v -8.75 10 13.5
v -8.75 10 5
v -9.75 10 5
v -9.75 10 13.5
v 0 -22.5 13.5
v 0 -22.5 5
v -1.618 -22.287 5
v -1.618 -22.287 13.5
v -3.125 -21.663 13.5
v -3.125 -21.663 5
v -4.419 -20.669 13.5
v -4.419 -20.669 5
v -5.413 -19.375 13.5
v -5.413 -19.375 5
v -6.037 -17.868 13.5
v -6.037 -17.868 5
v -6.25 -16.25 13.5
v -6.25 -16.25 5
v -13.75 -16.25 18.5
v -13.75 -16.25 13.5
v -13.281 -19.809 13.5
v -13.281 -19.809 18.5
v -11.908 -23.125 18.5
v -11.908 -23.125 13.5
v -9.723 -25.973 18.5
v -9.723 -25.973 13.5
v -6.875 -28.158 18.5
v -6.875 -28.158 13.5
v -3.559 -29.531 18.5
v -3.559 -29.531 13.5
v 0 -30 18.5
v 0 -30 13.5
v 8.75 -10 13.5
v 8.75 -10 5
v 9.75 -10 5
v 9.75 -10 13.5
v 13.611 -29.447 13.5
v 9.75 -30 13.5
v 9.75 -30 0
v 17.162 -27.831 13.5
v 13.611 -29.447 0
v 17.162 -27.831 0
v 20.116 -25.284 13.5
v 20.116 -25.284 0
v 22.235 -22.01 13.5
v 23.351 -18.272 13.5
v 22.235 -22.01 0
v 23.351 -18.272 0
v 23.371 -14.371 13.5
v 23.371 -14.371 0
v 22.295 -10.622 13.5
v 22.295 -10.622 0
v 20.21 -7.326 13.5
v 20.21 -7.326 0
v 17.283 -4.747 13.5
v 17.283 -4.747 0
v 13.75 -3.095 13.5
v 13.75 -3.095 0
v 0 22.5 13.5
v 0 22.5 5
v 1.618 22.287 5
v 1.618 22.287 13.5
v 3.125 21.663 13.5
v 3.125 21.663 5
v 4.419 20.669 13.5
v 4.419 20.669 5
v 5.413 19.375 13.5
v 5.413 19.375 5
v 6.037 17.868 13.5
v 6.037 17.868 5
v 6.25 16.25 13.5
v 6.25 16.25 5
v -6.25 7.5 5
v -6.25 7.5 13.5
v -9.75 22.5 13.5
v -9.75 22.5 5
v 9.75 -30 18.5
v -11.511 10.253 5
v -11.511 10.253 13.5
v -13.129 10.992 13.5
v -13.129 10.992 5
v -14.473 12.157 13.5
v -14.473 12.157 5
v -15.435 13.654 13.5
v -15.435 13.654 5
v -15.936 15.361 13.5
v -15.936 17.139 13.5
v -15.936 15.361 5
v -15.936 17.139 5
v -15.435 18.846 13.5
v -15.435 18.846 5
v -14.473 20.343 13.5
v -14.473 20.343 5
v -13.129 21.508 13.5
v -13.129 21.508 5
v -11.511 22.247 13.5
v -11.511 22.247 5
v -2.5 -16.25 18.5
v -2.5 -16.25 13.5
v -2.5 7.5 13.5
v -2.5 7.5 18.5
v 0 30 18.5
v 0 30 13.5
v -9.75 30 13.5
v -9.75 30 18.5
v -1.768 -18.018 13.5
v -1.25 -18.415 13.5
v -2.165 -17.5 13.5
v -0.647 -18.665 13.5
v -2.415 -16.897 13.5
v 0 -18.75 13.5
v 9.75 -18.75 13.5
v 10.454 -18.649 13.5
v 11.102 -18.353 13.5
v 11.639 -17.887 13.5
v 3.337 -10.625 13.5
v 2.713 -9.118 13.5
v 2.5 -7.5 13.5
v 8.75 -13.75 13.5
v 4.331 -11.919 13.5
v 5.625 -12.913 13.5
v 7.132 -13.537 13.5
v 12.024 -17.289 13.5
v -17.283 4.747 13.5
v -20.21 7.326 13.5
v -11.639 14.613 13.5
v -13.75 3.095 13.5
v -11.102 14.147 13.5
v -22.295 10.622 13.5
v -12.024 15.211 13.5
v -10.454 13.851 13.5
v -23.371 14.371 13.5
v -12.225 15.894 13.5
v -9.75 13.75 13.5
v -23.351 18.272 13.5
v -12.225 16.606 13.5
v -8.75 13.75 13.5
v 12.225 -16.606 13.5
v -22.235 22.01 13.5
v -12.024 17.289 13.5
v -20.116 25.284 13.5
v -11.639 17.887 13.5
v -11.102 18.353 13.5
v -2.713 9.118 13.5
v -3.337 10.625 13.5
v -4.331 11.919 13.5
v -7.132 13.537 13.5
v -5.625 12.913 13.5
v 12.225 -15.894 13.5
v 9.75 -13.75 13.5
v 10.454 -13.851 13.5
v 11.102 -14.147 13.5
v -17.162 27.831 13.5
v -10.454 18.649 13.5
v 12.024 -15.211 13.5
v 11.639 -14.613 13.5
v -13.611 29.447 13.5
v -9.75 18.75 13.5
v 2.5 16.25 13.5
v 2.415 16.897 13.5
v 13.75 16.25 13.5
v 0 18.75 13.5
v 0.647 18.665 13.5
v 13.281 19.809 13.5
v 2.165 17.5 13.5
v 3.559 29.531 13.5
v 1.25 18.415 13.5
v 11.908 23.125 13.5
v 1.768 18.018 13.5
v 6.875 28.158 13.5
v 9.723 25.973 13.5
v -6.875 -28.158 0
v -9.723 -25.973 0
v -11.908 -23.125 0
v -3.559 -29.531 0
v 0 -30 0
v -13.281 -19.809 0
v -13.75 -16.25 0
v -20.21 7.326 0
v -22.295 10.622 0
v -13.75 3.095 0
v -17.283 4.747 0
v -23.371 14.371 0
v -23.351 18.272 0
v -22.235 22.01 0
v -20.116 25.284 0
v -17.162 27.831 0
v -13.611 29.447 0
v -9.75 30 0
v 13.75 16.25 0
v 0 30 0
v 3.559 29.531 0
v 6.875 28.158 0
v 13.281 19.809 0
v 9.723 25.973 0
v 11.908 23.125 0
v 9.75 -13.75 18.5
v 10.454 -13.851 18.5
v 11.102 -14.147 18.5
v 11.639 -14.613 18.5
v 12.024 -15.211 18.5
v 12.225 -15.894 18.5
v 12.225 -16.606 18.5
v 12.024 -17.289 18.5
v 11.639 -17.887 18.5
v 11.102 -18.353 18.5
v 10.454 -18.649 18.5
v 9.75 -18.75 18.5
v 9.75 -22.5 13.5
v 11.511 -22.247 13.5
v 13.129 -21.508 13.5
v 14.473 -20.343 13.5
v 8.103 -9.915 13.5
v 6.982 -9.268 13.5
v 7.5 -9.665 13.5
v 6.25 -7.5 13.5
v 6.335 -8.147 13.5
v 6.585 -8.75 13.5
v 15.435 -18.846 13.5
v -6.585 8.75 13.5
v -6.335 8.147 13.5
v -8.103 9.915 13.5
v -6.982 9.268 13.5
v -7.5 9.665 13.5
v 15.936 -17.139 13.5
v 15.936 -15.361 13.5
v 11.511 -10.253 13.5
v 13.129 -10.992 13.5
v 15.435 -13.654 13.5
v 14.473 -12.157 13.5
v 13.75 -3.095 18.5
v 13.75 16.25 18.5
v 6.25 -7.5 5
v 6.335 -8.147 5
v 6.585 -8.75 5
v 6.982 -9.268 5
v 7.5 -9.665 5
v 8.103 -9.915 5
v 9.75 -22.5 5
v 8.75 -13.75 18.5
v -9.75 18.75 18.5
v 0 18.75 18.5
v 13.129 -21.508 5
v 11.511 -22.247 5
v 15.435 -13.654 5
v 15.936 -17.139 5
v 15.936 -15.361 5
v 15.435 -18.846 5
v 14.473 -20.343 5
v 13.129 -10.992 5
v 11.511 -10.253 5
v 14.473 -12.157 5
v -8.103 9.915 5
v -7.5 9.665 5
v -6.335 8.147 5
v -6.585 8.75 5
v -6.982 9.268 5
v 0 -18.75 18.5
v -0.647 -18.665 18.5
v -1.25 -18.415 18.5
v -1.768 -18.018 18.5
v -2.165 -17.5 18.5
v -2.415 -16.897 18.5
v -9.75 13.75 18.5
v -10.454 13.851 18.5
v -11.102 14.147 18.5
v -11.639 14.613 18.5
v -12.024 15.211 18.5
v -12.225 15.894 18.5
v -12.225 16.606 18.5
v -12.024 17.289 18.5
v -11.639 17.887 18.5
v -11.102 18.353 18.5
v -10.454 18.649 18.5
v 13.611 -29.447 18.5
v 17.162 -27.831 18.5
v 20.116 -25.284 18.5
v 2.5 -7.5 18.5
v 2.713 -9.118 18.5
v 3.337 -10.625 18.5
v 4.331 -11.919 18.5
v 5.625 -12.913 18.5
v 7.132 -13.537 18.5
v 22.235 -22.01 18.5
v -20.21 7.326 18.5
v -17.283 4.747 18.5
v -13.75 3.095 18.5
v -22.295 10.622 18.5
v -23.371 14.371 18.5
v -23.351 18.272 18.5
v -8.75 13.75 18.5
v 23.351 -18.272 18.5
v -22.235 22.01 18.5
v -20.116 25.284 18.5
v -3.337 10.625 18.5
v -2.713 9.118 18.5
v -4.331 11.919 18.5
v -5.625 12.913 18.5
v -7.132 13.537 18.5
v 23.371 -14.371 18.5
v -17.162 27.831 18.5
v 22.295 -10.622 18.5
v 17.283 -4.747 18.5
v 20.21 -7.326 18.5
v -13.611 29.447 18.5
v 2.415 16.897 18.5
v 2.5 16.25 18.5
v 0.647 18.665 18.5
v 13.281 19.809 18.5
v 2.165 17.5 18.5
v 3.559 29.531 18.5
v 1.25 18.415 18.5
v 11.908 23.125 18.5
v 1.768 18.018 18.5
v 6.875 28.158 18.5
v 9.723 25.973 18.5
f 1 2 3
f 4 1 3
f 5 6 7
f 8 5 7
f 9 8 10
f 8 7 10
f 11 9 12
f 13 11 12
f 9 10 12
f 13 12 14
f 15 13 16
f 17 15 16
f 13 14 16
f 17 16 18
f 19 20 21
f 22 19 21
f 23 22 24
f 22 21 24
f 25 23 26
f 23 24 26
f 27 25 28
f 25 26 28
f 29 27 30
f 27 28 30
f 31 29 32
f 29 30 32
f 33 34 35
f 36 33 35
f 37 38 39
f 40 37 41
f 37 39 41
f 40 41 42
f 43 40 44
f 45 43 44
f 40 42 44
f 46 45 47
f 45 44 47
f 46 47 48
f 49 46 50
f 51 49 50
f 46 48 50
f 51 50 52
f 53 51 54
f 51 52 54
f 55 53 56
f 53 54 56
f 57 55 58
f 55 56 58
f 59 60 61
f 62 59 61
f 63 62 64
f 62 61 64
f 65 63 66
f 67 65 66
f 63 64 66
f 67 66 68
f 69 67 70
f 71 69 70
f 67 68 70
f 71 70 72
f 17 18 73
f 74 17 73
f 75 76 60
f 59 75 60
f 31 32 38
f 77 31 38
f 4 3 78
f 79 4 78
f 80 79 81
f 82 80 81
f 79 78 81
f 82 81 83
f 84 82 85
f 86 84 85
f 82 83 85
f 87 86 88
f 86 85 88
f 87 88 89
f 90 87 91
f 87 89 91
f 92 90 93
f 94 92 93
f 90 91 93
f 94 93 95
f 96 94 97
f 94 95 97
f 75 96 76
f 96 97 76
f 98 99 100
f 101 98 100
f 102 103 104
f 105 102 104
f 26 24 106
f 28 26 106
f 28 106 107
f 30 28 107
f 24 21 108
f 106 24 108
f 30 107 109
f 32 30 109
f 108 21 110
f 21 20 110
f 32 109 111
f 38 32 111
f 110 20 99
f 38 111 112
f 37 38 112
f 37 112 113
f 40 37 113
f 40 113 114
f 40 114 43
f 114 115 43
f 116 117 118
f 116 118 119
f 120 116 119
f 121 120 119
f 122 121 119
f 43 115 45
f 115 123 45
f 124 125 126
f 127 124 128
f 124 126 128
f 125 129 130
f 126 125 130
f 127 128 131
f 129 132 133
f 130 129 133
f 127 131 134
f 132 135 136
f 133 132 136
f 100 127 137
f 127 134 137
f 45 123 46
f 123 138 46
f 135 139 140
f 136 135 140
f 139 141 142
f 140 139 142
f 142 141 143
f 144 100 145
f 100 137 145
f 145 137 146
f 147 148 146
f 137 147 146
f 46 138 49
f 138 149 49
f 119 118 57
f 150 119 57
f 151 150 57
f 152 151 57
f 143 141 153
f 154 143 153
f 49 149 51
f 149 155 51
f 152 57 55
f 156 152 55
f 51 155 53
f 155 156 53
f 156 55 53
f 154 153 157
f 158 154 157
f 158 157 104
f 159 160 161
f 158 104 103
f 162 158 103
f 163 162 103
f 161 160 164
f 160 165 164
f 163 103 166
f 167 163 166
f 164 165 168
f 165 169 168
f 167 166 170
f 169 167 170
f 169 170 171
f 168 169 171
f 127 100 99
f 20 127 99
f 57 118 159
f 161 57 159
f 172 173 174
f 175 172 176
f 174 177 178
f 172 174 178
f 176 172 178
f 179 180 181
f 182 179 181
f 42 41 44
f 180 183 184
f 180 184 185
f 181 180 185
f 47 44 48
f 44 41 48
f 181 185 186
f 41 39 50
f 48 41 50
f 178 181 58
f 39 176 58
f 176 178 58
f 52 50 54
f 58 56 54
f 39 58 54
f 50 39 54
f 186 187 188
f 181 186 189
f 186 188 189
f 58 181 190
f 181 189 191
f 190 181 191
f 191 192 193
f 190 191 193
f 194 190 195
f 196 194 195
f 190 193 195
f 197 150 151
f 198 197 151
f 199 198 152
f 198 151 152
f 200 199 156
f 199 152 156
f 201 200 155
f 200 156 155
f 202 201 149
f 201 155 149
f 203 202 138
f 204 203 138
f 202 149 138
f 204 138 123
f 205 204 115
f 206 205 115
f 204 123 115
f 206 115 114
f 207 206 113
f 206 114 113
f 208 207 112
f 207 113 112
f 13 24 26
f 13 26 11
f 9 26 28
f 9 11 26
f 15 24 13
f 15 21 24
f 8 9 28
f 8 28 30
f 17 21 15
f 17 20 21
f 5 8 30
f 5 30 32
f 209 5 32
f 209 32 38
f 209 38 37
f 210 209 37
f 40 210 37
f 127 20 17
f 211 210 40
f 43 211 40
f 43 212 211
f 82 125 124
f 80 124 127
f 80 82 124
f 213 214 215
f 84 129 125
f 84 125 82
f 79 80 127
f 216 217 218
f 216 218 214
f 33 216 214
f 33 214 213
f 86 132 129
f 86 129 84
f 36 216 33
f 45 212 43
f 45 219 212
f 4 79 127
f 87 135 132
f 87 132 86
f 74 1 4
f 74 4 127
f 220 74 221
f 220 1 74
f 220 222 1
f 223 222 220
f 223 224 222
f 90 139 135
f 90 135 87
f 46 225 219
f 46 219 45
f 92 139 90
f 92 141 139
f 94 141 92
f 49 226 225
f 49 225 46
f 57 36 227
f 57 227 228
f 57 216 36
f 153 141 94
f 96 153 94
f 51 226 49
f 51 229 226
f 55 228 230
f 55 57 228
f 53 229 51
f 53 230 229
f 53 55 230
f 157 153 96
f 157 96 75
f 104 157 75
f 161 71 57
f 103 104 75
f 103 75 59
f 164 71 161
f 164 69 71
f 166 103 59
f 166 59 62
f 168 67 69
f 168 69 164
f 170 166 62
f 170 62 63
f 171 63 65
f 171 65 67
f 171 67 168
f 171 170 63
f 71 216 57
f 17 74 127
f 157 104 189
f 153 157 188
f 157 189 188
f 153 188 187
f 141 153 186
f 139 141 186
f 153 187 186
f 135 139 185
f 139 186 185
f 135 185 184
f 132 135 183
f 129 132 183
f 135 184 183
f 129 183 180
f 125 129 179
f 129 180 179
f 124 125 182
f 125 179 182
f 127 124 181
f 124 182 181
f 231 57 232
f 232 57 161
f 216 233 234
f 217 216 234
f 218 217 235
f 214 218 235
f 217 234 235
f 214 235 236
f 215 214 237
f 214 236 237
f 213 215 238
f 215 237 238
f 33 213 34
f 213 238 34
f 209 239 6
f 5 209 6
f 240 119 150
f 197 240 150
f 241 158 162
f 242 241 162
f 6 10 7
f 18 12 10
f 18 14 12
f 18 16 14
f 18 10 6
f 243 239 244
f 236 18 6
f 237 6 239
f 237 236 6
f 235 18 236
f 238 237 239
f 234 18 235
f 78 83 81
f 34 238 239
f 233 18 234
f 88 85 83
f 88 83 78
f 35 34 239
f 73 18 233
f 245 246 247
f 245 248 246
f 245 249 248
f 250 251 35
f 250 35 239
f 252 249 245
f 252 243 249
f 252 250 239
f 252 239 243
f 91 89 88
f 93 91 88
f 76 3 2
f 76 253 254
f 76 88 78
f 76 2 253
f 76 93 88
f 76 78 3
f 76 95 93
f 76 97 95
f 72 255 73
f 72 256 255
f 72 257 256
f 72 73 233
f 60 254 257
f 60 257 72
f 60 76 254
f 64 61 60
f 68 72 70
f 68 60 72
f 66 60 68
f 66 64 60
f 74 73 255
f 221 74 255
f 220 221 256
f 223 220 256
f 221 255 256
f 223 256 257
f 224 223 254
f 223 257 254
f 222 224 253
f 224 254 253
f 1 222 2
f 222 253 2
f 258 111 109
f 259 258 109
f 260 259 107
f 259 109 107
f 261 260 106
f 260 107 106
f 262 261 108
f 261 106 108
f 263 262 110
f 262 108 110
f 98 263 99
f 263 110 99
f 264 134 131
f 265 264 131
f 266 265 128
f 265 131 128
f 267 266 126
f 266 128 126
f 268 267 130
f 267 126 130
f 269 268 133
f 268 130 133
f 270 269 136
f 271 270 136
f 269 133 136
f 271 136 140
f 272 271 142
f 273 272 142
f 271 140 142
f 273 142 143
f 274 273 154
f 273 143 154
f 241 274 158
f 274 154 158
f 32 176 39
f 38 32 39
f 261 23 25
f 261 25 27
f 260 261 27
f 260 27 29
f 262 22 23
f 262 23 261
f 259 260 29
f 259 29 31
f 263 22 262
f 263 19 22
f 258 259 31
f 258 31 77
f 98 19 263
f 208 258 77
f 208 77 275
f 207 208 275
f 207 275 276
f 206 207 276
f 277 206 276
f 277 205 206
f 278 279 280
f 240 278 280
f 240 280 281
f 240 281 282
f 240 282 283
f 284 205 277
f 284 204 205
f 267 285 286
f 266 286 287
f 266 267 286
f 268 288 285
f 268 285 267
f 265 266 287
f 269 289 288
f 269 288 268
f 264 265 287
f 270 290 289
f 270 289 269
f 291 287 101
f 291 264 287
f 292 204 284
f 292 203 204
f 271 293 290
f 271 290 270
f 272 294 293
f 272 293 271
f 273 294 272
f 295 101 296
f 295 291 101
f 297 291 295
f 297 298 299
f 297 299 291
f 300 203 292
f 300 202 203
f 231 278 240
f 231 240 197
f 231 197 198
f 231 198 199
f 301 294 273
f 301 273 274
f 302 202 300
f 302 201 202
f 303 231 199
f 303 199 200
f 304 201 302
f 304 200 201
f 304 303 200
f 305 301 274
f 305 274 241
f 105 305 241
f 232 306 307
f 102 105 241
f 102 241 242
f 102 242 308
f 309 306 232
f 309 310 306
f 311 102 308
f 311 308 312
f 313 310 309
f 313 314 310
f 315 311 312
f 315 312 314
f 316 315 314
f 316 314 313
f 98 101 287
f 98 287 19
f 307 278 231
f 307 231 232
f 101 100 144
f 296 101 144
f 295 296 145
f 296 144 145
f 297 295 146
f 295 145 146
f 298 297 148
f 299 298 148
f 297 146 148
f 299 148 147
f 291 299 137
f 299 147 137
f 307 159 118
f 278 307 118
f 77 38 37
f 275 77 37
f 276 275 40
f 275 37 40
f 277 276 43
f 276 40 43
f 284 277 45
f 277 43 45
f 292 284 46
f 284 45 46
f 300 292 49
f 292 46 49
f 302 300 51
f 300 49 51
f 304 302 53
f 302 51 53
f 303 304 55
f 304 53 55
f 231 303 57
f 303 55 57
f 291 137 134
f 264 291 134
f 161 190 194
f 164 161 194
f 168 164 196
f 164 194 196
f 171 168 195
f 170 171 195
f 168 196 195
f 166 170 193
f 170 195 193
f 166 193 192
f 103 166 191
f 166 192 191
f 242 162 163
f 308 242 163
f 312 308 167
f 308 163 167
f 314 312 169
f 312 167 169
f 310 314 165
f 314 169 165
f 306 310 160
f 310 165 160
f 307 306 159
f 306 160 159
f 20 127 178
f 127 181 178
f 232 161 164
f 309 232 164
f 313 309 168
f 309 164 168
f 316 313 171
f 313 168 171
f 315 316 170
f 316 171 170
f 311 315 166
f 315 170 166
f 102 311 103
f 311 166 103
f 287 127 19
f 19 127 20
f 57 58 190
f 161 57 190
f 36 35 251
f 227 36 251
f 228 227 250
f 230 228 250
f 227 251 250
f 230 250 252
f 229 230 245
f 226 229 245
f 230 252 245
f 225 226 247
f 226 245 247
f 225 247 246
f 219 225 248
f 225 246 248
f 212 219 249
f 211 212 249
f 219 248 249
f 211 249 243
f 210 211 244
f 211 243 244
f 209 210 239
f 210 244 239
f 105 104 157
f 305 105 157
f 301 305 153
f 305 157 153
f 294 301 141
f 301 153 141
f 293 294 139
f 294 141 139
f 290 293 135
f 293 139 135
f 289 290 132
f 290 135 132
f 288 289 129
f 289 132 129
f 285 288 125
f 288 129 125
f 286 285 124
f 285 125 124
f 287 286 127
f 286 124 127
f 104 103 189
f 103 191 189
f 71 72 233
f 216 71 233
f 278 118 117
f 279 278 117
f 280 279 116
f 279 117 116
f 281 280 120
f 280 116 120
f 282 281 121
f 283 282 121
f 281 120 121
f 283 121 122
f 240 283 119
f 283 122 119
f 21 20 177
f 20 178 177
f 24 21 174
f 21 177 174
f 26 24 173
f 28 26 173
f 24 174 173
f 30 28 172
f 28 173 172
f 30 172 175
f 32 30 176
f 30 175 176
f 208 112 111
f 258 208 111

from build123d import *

# Parameters (mm, degrees)
F1_DEPTH = 5
F2_START = 5
F2_DEPTH = 8.5
F3_START = 13.5
F3_DEPTH = 5


with BuildPart() as f1:
    # F0 (on Top) → F1 (new body)
    with BuildSketch(Plane.XY):
        with BuildLine():
            ThreePointArc((13.7499991953, 16.25), (9.7227176723, 25.9727176723), (0, 29.9999991953))
            Line((0, 29.9999991953), (-9.75, 29.9999991953))
            ThreePointArc((-9.75, 29.9999991953), (-23.3505172364, 18.2719813983), (-13.7499991953, 3.0946784794))
            Line((-13.7499991953, 3.0946784794), (-13.7499991953, -16.25))
            ThreePointArc((-13.7499991953, -16.25), (-9.7227176723, -25.9727176723), (0, -29.9999991953))
            Line((0, -29.9999991953), (9.75, -29.9999991953))
            ThreePointArc((9.75, -29.9999991953), (23.3505172364, -18.2719813983), (13.7499991953, -3.0946784794))
            Line((13.7499991953, -3.0946784794), (13.7499991953, 16.25))
        make_face()
        with BuildLine():
            ThreePointArc((-9.75, 10), (-16, 16.25), (-9.75, 22.5))
            Line((-9.75, 22.5), (0, 22.5))
            ThreePointArc((0, 22.5), (4.4194173824, 20.6694173824), (6.25, 16.25))
            Line((6.25, 16.25), (6.25, -7.5))
            ThreePointArc((6.25, -7.5), (6.982233047, -9.267766953), (8.75, -10))
            Line((8.75, -10), (9.75, -10))
            ThreePointArc((9.75, -10), (16, -16.25), (9.75, -22.5))
            Line((9.75, -22.5), (0, -22.5))
            ThreePointArc((0, -22.5), (-4.4194173824, -20.6694173824), (-6.25, -16.25))
            Line((-6.25, -16.25), (-6.25, 7.5))
            ThreePointArc((-6.25, 7.5), (-6.982233047, 9.267766953), (-8.75, 10))
            Line((-8.75, 10), (-9.75, 10))
        make_face(mode=Mode.SUBTRACT)
        with BuildLine():
            Line((0, 22.5), (-9.75, 22.5))
            ThreePointArc((-9.75, 22.5), (-16, 16.25), (-9.75, 10))
            Line((-9.75, 10), (-8.75, 10))
            ThreePointArc((-8.75, 10), (-6.982233047, 9.267766953), (-6.25, 7.5))
            Line((-6.25, 7.5), (-6.25, -16.25))
            ThreePointArc((-6.25, -16.25), (-4.4194173824, -20.6694173824), (0, -22.5))
            Line((0, -22.5), (9.75, -22.5))
            ThreePointArc((9.75, -22.5), (16, -16.25), (9.75, -10))
            Line((9.75, -10), (8.75, -10))
            ThreePointArc((8.75, -10), (6.982233047, -9.267766953), (6.25, -7.5))
            Line((6.25, -7.5), (6.25, 16.25))
            ThreePointArc((6.25, 16.25), (4.4194173824, 20.6694173824), (0, 22.5))
        make_face()
        with BuildLine():
            Line((-2.5, -16.25), (-2.5, 7.5))
            ThreePointArc((-2.5, 7.5), (-4.3305826176, 11.9194173824), (-8.75, 13.75))
            Line((-8.75, 13.75), (-9.75, 13.75))
            ThreePointArc((-9.75, 13.75), (-12.25, 16.25), (-9.75, 18.75))
            Line((-9.75, 18.75), (0, 18.75))
            ThreePointArc((0, 18.75), (1.767766953, 18.017766953), (2.5, 16.25))
            Line((2.5, 16.25), (2.5, -7.5))
            ThreePointArc((2.5, -7.5), (4.3305826176, -11.9194173824), (8.75, -13.75))
            Line((8.75, -13.75), (9.75, -13.75))
            ThreePointArc((9.75, -13.75), (12.25, -16.25), (9.75, -18.75))
            Line((9.75, -18.75), (0, -18.75))
            ThreePointArc((0, -18.75), (-1.767766953, -18.017766953), (-2.5, -16.25))
        make_face(mode=Mode.SUBTRACT)
        with BuildLine():
            ThreePointArc((-8.75, 13.75), (-4.3305826176, 11.9194173824), (-2.5, 7.5))
            Line((-2.5, 7.5), (-2.5, -16.25))
            ThreePointArc((-2.5, -16.25), (-1.767766953, -18.017766953), (0, -18.75))
            Line((0, -18.75), (9.75, -18.75))
            ThreePointArc((9.75, -18.75), (12.25, -16.25), (9.75, -13.75))
            Line((9.75, -13.75), (8.75, -13.75))
            ThreePointArc((8.75, -13.75), (4.3305826176, -11.9194173824), (2.5, -7.5))
            Line((2.5, -7.5), (2.5, 16.25))
            ThreePointArc((2.5, 16.25), (1.767766953, 18.017766953), (0, 18.75))
            Line((0, 18.75), (-9.75, 18.75))
            ThreePointArc((-9.75, 18.75), (-12.25, 16.25), (-9.75, 13.75))
            Line((-9.75, 13.75), (-8.75, 13.75))
        make_face()
    extrude(amount=F1_DEPTH)

    # F0 (on Top) → F2 (join)
    with BuildSketch(Plane.XY.offset(F2_START)):
        with BuildLine():
            ThreePointArc((13.7499991953, 16.25), (9.7227176723, 25.9727176723), (0, 29.9999991953))
            Line((0, 29.9999991953), (-9.75, 29.9999991953))
            ThreePointArc((-9.75, 29.9999991953), (-23.3505172364, 18.2719813983), (-13.7499991953, 3.0946784794))
            Line((-13.7499991953, 3.0946784794), (-13.7499991953, -16.25))
            ThreePointArc((-13.7499991953, -16.25), (-9.7227176723, -25.9727176723), (0, -29.9999991953))
            Line((0, -29.9999991953), (9.75, -29.9999991953))
            ThreePointArc((9.75, -29.9999991953), (23.3505172364, -18.2719813983), (13.7499991953, -3.0946784794))
            Line((13.7499991953, -3.0946784794), (13.7499991953, 16.25))
        make_face()
        with BuildLine():
            ThreePointArc((-9.75, 10), (-16, 16.25), (-9.75, 22.5))
            Line((-9.75, 22.5), (0, 22.5))
            ThreePointArc((0, 22.5), (4.4194173824, 20.6694173824), (6.25, 16.25))
            Line((6.25, 16.25), (6.25, -7.5))
            ThreePointArc((6.25, -7.5), (6.982233047, -9.267766953), (8.75, -10))
            Line((8.75, -10), (9.75, -10))
            ThreePointArc((9.75, -10), (16, -16.25), (9.75, -22.5))
            Line((9.75, -22.5), (0, -22.5))
            ThreePointArc((0, -22.5), (-4.4194173824, -20.6694173824), (-6.25, -16.25))
            Line((-6.25, -16.25), (-6.25, 7.5))
            ThreePointArc((-6.25, 7.5), (-6.982233047, 9.267766953), (-8.75, 10))
            Line((-8.75, 10), (-9.75, 10))
        make_face(mode=Mode.SUBTRACT)
    extrude(amount=F2_DEPTH)


with BuildPart() as f3:
    # F0 (on Top) → F3 (new body)
    with BuildSketch(Plane.XY.offset(F3_START)):
        with BuildLine():
            ThreePointArc((13.7499991953, 16.25), (9.7227176723, 25.9727176723), (0, 29.9999991953))
            Line((0, 29.9999991953), (-9.75, 29.9999991953))
            ThreePointArc((-9.75, 29.9999991953), (-23.3505172364, 18.2719813983), (-13.7499991953, 3.0946784794))
            Line((-13.7499991953, 3.0946784794), (-13.7499991953, -16.25))
            ThreePointArc((-13.7499991953, -16.25), (-9.7227176723, -25.9727176723), (0, -29.9999991953))
            Line((0, -29.9999991953), (9.75, -29.9999991953))
            ThreePointArc((9.75, -29.9999991953), (23.3505172364, -18.2719813983), (13.7499991953, -3.0946784794))
            Line((13.7499991953, -3.0946784794), (13.7499991953, 16.25))
        make_face()
        with BuildLine():
            ThreePointArc((-9.75, 10), (-16, 16.25), (-9.75, 22.5))
            Line((-9.75, 22.5), (0, 22.5))
            ThreePointArc((0, 22.5), (4.4194173824, 20.6694173824), (6.25, 16.25))
            Line((6.25, 16.25), (6.25, -7.5))
            ThreePointArc((6.25, -7.5), (6.982233047, -9.267766953), (8.75, -10))
            Line((8.75, -10), (9.75, -10))
            ThreePointArc((9.75, -10), (16, -16.25), (9.75, -22.5))
            Line((9.75, -22.5), (0, -22.5))
            ThreePointArc((0, -22.5), (-4.4194173824, -20.6694173824), (-6.25, -16.25))
            Line((-6.25, -16.25), (-6.25, 7.5))
            ThreePointArc((-6.25, 7.5), (-6.982233047, 9.267766953), (-8.75, 10))
            Line((-8.75, 10), (-9.75, 10))
        make_face(mode=Mode.SUBTRACT)
        with BuildLine():
            Line((0, 22.5), (-9.75, 22.5))
            ThreePointArc((-9.75, 22.5), (-16, 16.25), (-9.75, 10))
            Line((-9.75, 10), (-8.75, 10))
            ThreePointArc((-8.75, 10), (-6.982233047, 9.267766953), (-6.25, 7.5))
            Line((-6.25, 7.5), (-6.25, -16.25))
            ThreePointArc((-6.25, -16.25), (-4.4194173824, -20.6694173824), (0, -22.5))
            Line((0, -22.5), (9.75, -22.5))
            ThreePointArc((9.75, -22.5), (16, -16.25), (9.75, -10))
            Line((9.75, -10), (8.75, -10))
            ThreePointArc((8.75, -10), (6.982233047, -9.267766953), (6.25, -7.5))
            Line((6.25, -7.5), (6.25, 16.25))
            ThreePointArc((6.25, 16.25), (4.4194173824, 20.6694173824), (0, 22.5))
        make_face()
        with BuildLine():
            Line((-2.5, -16.25), (-2.5, 7.5))
            ThreePointArc((-2.5, 7.5), (-4.3305826176, 11.9194173824), (-8.75, 13.75))
            Line((-8.75, 13.75), (-9.75, 13.75))
            ThreePointArc((-9.75, 13.75), (-12.25, 16.25), (-9.75, 18.75))
            Line((-9.75, 18.75), (0, 18.75))
            ThreePointArc((0, 18.75), (1.767766953, 18.017766953), (2.5, 16.25))
            Line((2.5, 16.25), (2.5, -7.5))
            ThreePointArc((2.5, -7.5), (4.3305826176, -11.9194173824), (8.75, -13.75))
            Line((8.75, -13.75), (9.75, -13.75))
            ThreePointArc((9.75, -13.75), (12.25, -16.25), (9.75, -18.75))
            Line((9.75, -18.75), (0, -18.75))
            ThreePointArc((0, -18.75), (-1.767766953, -18.017766953), (-2.5, -16.25))
        make_face(mode=Mode.SUBTRACT)
    extrude(amount=F3_DEPTH)


solid = Compound([f1.part, f3.part])
